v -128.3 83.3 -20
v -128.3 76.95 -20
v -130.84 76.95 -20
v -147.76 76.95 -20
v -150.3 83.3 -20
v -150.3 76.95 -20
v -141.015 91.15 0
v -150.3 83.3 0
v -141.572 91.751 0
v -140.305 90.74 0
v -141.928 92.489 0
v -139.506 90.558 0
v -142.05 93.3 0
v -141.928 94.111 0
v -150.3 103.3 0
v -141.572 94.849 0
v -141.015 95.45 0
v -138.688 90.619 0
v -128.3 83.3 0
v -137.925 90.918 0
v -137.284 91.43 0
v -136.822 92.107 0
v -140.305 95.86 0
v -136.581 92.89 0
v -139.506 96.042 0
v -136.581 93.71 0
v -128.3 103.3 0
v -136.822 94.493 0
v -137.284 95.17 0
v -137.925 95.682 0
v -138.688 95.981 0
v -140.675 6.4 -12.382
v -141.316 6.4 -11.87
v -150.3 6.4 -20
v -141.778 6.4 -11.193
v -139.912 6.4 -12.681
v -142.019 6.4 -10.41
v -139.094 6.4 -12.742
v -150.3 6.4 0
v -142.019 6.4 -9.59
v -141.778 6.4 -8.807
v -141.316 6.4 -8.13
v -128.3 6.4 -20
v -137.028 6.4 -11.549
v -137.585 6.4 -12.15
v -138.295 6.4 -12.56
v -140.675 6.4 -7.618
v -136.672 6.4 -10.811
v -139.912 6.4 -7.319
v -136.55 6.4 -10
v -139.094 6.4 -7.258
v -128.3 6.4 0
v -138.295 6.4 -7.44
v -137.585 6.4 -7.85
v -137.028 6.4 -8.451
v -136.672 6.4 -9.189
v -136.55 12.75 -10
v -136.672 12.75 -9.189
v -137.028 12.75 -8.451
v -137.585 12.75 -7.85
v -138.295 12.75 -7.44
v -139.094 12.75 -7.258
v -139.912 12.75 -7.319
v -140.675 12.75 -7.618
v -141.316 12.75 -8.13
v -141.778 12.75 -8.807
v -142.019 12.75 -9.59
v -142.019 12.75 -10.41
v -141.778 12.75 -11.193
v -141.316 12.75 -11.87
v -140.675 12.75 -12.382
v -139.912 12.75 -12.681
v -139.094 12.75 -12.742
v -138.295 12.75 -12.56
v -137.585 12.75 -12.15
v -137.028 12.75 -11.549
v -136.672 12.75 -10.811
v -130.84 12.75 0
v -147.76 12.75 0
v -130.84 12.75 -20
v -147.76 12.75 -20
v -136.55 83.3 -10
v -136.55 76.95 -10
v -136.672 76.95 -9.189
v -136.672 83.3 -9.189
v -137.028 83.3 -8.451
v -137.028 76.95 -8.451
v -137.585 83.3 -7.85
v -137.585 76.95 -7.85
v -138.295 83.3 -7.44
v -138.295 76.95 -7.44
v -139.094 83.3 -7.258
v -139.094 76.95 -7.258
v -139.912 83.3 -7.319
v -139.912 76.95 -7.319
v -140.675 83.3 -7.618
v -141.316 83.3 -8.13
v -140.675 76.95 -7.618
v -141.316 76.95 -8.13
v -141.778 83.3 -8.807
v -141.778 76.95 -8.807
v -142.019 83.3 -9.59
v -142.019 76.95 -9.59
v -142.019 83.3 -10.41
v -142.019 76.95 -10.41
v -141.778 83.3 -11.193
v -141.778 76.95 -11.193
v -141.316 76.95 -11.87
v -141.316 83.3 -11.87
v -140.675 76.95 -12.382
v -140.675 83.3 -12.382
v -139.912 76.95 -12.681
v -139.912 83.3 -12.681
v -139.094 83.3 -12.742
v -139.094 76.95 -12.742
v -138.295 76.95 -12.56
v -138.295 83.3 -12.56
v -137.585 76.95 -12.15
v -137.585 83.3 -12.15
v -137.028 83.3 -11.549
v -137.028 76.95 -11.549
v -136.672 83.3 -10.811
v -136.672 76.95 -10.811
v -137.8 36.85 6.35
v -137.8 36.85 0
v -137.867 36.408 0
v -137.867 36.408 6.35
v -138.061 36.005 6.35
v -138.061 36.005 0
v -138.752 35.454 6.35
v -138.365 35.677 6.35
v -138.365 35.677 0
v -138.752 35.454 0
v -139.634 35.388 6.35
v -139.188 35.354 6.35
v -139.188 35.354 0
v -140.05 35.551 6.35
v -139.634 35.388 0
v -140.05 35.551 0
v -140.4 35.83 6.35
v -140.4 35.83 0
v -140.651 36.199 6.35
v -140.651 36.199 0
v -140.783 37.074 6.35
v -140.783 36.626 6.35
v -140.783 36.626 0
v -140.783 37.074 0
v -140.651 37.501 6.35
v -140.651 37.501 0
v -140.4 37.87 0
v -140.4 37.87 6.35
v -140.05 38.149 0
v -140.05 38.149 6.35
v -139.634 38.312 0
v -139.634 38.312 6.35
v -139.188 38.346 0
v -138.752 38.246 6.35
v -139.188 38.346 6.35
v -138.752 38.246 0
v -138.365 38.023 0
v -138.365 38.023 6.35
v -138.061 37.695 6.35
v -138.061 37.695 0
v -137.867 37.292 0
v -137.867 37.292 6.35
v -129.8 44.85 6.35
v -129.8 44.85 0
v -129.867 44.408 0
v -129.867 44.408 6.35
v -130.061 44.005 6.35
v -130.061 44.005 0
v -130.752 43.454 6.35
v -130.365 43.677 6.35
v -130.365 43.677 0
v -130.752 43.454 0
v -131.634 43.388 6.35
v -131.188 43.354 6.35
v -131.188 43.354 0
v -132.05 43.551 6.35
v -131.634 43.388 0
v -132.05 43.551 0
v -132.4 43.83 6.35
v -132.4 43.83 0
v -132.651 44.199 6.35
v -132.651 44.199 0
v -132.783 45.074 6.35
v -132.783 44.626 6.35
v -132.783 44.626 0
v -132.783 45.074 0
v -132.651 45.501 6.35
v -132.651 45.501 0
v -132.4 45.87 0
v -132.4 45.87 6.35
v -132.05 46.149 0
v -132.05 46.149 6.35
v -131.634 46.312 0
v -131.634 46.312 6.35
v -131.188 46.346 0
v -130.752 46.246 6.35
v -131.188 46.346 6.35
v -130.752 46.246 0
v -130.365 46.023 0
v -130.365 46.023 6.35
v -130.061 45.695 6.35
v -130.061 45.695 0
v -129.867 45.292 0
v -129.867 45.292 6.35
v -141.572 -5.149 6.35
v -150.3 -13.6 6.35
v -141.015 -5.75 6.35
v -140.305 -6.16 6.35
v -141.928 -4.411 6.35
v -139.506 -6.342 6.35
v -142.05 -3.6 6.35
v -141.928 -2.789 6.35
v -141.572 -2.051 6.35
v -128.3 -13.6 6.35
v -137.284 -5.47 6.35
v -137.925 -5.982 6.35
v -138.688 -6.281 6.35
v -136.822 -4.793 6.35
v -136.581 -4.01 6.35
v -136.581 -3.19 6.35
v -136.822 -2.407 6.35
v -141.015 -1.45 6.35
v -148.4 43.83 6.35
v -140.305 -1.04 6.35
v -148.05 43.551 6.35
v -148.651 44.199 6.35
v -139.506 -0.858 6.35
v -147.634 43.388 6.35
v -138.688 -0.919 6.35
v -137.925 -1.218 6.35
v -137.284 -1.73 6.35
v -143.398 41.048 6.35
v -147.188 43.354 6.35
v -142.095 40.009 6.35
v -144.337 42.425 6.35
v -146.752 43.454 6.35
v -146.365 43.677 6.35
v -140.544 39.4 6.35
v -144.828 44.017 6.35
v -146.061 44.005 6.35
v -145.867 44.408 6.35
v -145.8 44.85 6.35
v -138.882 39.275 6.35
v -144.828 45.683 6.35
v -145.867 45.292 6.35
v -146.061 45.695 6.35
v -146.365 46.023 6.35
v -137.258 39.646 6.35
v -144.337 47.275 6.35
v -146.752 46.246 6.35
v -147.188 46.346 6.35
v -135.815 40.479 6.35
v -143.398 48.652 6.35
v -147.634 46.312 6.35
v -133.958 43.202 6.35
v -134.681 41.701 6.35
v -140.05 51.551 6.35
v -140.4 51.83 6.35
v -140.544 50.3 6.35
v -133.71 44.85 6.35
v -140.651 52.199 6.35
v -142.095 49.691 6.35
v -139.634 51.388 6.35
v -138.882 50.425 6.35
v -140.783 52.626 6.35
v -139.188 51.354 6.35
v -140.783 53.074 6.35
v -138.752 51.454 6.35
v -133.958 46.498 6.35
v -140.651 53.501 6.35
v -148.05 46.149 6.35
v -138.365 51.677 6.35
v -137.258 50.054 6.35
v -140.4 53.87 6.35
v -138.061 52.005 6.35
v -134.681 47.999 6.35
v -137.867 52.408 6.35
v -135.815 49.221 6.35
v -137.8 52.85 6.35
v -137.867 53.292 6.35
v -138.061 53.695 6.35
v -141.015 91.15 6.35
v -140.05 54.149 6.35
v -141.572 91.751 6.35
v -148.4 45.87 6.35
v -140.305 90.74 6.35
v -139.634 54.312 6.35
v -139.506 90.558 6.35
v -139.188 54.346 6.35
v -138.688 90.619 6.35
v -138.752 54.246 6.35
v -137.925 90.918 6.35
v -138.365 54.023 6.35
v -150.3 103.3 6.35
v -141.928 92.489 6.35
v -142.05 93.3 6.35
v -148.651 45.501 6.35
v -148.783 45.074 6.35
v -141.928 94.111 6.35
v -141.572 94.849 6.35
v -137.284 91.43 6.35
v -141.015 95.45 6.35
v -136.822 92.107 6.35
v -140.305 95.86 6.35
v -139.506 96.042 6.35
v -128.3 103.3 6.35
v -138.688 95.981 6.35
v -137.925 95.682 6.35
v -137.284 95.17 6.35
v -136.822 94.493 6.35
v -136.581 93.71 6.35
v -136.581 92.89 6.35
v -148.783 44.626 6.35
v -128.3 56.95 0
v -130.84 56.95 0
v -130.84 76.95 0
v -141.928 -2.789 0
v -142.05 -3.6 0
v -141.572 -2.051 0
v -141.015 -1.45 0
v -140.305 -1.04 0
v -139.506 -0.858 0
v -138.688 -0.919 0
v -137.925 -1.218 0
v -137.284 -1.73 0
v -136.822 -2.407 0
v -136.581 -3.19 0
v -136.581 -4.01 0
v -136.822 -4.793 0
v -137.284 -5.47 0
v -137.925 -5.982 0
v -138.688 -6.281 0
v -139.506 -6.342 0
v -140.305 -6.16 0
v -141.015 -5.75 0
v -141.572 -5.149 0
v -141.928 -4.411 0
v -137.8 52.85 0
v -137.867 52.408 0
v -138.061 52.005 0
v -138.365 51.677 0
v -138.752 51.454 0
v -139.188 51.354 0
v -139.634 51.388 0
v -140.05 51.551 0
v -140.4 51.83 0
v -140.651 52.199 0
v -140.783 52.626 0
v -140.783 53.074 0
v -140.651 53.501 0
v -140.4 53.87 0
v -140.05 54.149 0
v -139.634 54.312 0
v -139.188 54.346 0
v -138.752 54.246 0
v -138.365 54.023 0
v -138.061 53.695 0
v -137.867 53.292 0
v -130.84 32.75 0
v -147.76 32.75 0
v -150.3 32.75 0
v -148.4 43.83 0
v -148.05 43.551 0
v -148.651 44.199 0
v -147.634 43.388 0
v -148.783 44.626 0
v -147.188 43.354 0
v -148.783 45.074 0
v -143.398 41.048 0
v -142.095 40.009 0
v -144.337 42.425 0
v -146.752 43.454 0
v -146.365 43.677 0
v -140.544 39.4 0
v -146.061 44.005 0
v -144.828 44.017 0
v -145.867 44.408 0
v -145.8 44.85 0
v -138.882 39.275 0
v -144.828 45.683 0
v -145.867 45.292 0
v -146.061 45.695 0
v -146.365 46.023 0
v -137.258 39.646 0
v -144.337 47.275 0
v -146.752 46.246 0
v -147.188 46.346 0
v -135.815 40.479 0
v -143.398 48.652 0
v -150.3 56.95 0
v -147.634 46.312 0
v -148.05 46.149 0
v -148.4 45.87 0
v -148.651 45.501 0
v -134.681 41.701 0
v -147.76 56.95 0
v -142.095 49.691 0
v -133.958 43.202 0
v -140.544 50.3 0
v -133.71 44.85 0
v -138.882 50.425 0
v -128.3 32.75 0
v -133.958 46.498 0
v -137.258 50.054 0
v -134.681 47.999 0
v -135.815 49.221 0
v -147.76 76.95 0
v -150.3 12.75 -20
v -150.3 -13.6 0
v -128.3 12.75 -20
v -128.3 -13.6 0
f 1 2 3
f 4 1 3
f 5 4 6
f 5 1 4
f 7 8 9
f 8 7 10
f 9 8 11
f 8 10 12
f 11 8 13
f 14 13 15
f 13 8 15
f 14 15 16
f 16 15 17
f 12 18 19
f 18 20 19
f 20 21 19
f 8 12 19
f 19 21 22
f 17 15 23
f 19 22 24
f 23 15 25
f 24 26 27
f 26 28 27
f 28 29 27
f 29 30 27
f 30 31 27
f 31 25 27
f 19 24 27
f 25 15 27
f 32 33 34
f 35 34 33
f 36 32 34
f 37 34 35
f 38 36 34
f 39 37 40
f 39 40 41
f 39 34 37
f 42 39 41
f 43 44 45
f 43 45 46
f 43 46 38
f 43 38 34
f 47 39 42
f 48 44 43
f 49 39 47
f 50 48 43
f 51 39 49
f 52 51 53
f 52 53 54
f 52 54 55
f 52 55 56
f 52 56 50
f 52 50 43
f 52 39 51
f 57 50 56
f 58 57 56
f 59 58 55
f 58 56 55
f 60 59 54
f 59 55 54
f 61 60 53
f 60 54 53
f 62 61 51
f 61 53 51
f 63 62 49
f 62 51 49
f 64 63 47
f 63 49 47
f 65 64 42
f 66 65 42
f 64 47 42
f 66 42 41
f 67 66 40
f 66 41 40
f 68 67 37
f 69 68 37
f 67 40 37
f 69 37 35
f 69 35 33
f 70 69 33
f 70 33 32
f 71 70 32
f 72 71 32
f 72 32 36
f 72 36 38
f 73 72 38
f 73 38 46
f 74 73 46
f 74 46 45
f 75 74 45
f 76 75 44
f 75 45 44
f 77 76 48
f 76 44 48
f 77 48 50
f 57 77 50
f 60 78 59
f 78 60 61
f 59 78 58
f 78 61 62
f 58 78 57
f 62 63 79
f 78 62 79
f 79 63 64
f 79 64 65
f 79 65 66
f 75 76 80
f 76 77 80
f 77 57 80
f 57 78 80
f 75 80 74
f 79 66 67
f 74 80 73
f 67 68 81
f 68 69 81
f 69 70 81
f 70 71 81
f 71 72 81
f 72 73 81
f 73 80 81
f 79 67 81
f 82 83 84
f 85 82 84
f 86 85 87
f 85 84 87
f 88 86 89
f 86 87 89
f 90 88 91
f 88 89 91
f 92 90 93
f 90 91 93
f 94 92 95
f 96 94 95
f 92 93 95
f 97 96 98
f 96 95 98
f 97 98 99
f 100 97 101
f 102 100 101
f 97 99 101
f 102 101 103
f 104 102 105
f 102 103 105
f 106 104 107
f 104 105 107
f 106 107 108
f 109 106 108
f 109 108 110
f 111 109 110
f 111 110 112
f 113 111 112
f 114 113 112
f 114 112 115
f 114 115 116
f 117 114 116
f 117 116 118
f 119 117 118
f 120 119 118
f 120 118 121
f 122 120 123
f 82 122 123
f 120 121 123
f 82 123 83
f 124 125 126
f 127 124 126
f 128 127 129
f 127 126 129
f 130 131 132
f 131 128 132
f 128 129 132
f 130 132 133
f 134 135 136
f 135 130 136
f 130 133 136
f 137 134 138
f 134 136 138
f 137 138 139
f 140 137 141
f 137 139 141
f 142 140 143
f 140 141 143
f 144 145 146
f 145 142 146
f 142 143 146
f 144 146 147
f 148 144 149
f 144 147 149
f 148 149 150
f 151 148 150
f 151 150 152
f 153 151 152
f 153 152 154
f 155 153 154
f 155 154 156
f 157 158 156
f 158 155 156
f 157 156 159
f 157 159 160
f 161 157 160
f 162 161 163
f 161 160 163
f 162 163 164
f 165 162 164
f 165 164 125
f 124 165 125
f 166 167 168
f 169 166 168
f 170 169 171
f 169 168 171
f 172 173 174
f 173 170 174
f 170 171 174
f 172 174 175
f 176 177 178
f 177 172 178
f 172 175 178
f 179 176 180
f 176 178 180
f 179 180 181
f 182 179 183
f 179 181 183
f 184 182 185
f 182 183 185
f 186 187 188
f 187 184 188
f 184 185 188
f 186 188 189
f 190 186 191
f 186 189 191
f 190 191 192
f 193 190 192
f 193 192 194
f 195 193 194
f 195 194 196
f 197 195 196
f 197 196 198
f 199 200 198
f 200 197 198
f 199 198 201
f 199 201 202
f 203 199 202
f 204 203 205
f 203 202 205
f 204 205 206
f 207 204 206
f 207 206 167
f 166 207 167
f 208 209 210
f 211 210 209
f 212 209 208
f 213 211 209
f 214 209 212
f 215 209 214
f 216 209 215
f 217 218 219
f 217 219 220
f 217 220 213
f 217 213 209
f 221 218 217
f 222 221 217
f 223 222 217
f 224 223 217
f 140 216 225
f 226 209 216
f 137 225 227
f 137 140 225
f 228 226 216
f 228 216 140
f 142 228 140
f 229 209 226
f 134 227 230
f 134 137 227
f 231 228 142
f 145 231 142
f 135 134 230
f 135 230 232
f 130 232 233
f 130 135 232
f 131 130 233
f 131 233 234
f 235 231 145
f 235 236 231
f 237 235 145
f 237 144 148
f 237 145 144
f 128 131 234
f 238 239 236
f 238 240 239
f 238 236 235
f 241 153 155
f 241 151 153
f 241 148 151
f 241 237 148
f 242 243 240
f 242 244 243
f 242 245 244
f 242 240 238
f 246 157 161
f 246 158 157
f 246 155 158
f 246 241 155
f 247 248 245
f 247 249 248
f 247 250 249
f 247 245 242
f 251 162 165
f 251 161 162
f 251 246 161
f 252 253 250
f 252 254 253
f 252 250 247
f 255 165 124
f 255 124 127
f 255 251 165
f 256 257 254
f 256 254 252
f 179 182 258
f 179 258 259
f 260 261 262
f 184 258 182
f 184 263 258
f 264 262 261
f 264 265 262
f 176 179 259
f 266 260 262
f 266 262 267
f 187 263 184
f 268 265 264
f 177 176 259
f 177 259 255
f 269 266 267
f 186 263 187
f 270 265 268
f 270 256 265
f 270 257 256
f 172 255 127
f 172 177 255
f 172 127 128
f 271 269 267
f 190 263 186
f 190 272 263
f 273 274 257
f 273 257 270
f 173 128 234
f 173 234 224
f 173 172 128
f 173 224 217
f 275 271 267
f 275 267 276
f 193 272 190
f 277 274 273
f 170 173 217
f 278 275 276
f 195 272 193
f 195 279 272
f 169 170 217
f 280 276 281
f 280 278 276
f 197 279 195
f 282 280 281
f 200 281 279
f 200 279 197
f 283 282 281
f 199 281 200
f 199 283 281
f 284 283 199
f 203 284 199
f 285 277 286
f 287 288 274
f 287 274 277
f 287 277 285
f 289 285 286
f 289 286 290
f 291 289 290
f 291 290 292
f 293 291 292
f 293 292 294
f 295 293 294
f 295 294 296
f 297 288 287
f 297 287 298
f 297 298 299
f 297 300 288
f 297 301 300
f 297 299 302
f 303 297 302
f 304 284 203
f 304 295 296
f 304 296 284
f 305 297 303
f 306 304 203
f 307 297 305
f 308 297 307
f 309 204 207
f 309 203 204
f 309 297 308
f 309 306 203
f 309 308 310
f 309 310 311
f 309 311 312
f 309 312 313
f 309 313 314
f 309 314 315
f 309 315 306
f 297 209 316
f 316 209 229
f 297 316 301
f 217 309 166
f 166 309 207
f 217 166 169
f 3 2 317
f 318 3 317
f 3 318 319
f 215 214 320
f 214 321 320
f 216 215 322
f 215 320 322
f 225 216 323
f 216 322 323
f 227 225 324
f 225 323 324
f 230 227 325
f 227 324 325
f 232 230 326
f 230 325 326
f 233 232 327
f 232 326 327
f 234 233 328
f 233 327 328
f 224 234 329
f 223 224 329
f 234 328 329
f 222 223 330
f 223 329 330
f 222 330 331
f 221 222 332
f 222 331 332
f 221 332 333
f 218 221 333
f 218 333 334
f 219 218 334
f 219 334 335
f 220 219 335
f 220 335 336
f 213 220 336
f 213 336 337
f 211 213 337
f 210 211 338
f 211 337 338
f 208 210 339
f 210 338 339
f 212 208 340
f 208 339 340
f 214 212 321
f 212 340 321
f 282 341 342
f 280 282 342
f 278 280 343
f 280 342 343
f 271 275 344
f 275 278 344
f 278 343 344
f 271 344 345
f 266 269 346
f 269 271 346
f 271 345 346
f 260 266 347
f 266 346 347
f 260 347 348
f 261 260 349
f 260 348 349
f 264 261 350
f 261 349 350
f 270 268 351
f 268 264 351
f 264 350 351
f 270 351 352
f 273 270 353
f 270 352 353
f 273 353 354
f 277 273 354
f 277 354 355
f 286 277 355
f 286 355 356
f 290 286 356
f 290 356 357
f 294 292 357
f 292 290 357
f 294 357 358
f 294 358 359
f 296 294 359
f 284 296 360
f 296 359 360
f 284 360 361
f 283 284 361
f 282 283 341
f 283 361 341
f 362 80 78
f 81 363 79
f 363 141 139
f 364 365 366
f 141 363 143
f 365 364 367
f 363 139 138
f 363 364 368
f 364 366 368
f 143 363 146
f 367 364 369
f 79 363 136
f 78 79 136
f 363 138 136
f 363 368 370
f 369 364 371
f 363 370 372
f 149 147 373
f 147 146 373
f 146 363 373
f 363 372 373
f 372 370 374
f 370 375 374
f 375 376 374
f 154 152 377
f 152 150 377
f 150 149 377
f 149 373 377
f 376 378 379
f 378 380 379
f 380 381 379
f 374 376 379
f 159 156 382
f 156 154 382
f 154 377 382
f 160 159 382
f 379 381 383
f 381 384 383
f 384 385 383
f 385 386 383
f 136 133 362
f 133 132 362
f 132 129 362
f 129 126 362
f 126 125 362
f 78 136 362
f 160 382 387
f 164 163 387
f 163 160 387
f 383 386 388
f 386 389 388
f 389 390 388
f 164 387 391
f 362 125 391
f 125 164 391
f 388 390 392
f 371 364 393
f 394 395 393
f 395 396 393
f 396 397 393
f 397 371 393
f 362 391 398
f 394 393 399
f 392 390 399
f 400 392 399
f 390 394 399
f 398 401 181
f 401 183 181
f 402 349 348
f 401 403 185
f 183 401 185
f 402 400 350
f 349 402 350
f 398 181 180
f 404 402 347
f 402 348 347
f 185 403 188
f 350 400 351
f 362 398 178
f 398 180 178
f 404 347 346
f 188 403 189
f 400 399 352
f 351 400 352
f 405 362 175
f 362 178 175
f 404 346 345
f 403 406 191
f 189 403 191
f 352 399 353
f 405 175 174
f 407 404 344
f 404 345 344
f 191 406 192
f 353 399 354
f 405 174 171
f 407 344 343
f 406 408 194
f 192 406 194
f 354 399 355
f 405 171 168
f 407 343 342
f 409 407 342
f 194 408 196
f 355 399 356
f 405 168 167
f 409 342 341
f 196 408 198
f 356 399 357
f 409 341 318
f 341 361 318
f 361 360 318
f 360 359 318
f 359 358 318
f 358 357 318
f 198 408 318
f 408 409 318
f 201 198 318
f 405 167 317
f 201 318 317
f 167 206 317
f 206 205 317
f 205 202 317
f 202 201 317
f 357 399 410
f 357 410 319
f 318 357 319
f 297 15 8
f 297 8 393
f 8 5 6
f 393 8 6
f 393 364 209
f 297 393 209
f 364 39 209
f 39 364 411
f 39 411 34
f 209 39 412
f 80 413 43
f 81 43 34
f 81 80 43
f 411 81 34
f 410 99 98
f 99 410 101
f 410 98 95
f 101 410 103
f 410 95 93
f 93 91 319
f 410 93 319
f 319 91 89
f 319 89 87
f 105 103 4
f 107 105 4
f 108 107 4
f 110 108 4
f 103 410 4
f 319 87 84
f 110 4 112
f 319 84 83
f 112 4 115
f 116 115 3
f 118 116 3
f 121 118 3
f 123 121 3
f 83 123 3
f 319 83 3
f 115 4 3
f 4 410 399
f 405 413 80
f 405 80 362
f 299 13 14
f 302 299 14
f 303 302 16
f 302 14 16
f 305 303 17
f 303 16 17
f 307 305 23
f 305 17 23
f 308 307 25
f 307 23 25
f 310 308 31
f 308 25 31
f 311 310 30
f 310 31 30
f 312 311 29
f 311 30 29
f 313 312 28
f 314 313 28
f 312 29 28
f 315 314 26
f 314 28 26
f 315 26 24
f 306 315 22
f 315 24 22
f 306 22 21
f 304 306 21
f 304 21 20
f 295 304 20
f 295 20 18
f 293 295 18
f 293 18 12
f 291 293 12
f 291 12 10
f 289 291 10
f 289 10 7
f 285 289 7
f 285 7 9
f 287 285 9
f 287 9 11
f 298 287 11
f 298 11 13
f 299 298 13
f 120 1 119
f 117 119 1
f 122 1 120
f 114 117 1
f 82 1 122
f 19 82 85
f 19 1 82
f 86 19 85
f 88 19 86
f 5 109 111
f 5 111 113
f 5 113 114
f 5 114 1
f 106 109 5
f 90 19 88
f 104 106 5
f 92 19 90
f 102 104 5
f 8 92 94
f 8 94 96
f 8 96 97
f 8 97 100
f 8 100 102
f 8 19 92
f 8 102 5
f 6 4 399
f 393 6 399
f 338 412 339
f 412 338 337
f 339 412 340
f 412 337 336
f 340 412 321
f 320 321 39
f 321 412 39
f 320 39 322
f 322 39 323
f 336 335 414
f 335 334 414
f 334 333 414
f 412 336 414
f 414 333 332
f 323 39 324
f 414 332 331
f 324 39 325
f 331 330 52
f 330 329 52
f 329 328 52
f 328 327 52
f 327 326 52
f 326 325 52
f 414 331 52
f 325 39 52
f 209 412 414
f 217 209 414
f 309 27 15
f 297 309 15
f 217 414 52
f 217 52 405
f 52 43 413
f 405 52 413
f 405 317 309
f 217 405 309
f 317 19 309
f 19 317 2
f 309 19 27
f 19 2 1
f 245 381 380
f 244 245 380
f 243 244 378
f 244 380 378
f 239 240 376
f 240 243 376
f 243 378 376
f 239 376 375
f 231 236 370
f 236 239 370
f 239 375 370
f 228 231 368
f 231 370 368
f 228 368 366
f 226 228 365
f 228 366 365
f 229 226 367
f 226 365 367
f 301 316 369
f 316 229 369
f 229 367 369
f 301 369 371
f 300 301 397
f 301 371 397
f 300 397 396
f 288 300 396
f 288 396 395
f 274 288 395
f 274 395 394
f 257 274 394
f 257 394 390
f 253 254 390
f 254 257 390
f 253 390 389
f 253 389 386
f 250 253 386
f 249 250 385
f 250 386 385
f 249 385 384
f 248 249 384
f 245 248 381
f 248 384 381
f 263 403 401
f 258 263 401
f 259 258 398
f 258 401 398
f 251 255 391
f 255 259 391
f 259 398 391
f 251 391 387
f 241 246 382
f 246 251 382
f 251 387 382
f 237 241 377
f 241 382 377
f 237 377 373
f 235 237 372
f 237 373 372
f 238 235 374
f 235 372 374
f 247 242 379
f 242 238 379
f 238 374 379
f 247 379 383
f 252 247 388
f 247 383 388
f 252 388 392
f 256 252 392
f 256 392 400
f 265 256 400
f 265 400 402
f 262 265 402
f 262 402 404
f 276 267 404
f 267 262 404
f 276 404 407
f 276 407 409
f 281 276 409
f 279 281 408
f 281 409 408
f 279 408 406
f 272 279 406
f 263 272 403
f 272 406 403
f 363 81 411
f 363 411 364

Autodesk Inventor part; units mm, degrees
ref_plane "YZ Plane" through (0, 0, 0) normal (1, 0, 0) x (0, 1, 0)
ref_plane "XZ Plane" through (0, 0, 0) normal (0, 1, 0) x (-1, 0, 0)
sketch "Sketch1" plane through (0, 0, 0) normal (0, 0, 1) x (1, 0, 0)
  circle A0 centre (-131.3, 44.85) radius 1.5 projected
  circle A1 centre (-147.3, 44.85) radius 1.5 projected
  circle A2 centre (-139.3, 52.85) radius 1.5 projected
  circle A3 centre (-139.3, 36.85) radius 1.5 projected
  circle A4 centre (-139.3, 44.85) radius 4 projected
  circle A5 centre (-139.3, 44.85) radius 11 projected
  line L0 (-250, 102.05) -> (-125, 102.05) projected
  line L1 (-250, 96.9) -> (-250, 102.05) projected
  line L2 (-125, 96.9) -> (-250, 96.9) projected
  line L3 (-125, 96.9) -> (-125, 102.05) projected
  line L4 (-125, 103.3) -> (-250, 103.3) projected
  line L5 (-125, 84.55) -> (-250, 84.55) projected
  line L6 (-125, 84.55) -> (-125, 89.7) projected
  line L7 (-125, 89.7) -> (-250, 89.7) projected
  line L8 (-250, 84.55) -> (-250, 89.7) projected
  line L9 (-250, 83.3) -> (-125, 83.3) projected
  line L10 (-250, 5.15) -> (-125, 5.15) projected
  line L11 (-250, 0) -> (-250, 5.15) projected
  line L12 (0, 0) -> (-250, 0) projected
  line L13 (-125, 0) -> (-125, 5.15) projected
  line L14 (-125, -12.35) -> (-250, -12.35) projected
  line L15 (-125, -12.35) -> (-125, -7.2) projected
  line L16 (-125, -7.2) -> (-250, -7.2) projected
  line L17 (-250, -12.35) -> (-250, -7.2) projected
  line L18 (-250, -13.6) -> (-125, -13.6) projected
  line L19 (-125, 6.4) -> (-250, 6.4) projected
  line L20 (-128.3, 103.3) -> (-150.3, 103.3)
  line L21 (-150.3, 103.3) -> (-150.3, -13.6)
  line L22 (-150.3, -13.6) -> (-128.3, -13.6)
  line L23 (-128.3, -13.6) -> (-128.3, 103.3)
  circle A6 centre (-139.3, 44.85) radius 5.5902
extrude "Extrusion1" add sketch "Sketch1" along normal blind 6.35 contours A5 | L23 L19 L21 A5 | A5 L21 L9 L23 | L23 L10 L21 L19 | L9 L21 L5 L23 | L23 L12 L21 L10 | L5 L21 L7 L23 | L23 L16 L21 L12 | L7 L21 L2 L23 | L23 L14 L21 L16 | L2 L21 L0 L23 | L23 L18 L21 L14 | L0 L21 L4 L23
sketch "Sketch2" plane through (0, 0, 0) normal (0, 0, -1) x (-1, 0, 0)
  line L0 (125, 5.15) -> (250, 5.15) projected
  line L1 (125, 5.15) -> (125, 0) projected
  line L2 (125, 0) -> (250, 0) projected
  line L3 (250, 5.15) -> (250, 0) projected
  line L4 (250, 6.4) -> (125, 6.4) projected
  line L5 (250, 84.55) -> (125, 84.55) projected
  line L6 (250, 89.7) -> (250, 84.55) projected
  line L7 (125, 89.7) -> (250, 89.7) projected
  line L8 (125, 89.7) -> (125, 84.55) projected
  line L9 (125, 83.3) -> (250, 83.3) projected
  circle A0 centre (139.3, 44.85) radius 5.5902 projected
  circle A1 centre (139.3, 36.85) radius 1.5 projected
  circle A2 centre (139.3, 52.85) radius 1.5 projected
  circle A3 centre (147.3, 44.85) radius 1.5 projected
  circle A4 centre (131.3, 44.85) radius 1.5 projected
  line L10 (128.3, 103.3) -> (150.3, 103.3) projected
  line L11 (128.3, -13.6) -> (128.3, 103.3) projected
  line L12 (150.3, -13.6) -> (128.3, -13.6) projected
  line L13 (150.3, 103.3) -> (150.3, -13.6) projected
  line L14 (128.3, -13.6) -> (128.3, 103.3) projected
  line L15 (150.3, 103.3) -> (150.3, -13.6) projected
  line L16 (128.3, 6.4) -> (150.3, 6.4)
  line L17 (150.3, 6.4) -> (150.3, 12.75)
  line L18 (150.3, 12.75) -> (128.3, 12.75)
  line L19 (128.3, 12.75) -> (128.3, 6.4)
  line L20 (128.3, 83.3) -> (150.3, 83.3)
  line L21 (150.3, 83.3) -> (150.3, 76.95)
  line L22 (150.3, 76.95) -> (128.3, 76.95)
  line L23 (128.3, 76.95) -> (128.3, 83.3)
  point P0 (0, 0)
  dimension "d2" = 6.35
  dimension "d3" = 6.35
ref_plane "Work Plane1" through (-250, -12.35, -20) normal (0, 0, -1) x (0, 1, 0)
extrude "Extrusion2" add sketch "Sketch2" along normal up to surface (20 mm away) contours L11 L18 L13 L4 | L11 L9 L13 L22
sketch "Sketch3" plane through (-128.3, -13.6, 6.35) normal (1, 0, 0) x (0, 0, -1)
  line L0 (6.35, 26.35) -> (26.35, 26.35) projected
  line L1 (26.35, 26.35) -> (6.35, 46.35)
  line L2 (6.35, 26.35) -> (6.35, 90.55) projected
  line L3 (6.35, 90.55) -> (26.35, 90.55) projected
  line L4 (26.35, 90.55) -> (6.35, 70.55)
  line L5 (6.35, 70.55) -> (6.35, 90.55)
  line L6 (26.35, 90.55) -> (6.35, 90.55)
  line L7 (6.35, 46.35) -> (6.35, 26.35)
  line L8 (26.35, 26.35) -> (6.35, 26.35)
  point P0 (6.35, 13.6)
  dimension "d6" = 45
  dimension "d7" = 45
extrude "Extrusion3" add sketch "Sketch3" against normal up to surface (22 mm away)
sketch "Sketch4" plane through (-128.3, 83.3, -20) normal (0, 0, -1) x (-1, 0, 0)
  line L0 (0, 0) -> (22, 0) projected
  line L1 (0, -6.35) -> (0, 0) projected
  line L2 (22, -6.35) -> (0, -6.35) projected
  line L3 (22, 0) -> (22, -6.35) projected
  line L4 (0, -76.9) -> (0, -70.55) projected
  line L5 (22, -76.9) -> (0, -76.9) projected
  line L6 (22, -70.55) -> (22, -76.9) projected
  line L7 (0, -70.55) -> (22, -70.55) projected
  line L8 (22, -26.35) -> (22, -6.35) projected
  line L9 (22, -6.35) -> (0, -6.35) projected
  line L10 (0, -26.35) -> (0, -6.35) projected
  line L11 (22, -26.35) -> (0, -26.35) projected
  line L12 (22, -70.55) -> (22, -50.55) projected
  line L13 (0, -50.55) -> (22, -50.55) projected
  line L14 (0, -70.55) -> (0, -50.55) projected
  line L15 (0, -70.55) -> (22, -70.55) projected
  line L16 (22, -6.35) -> (0, -6.35) projected
  line L17 (11, -6.35) -> (11, -70.55)
  line L18 (0, -70.55) -> (22, -70.55) projected
  line L19 (19.46, -70.55) -> (2.54, -70.55)
  line L20 (2.54, -70.55) -> (2.54, -6.35)
  line L21 (2.54, -6.35) -> (19.46, -6.35)
  line L22 (19.46, -6.35) -> (19.46, -70.55)
  line L23 (19.46, -70.55) -> (2.54, -6.35) construction
  line L24 (2.54, -70.55) -> (19.46, -6.35) construction
  point P0 (-128.3, -83.3)
  point P1 (11, -38.45)
  dimension "d10" = 2.54
extrude "Extrusion4" cut sketch "Sketch4" against normal up to surface (20 mm away) contours L2 L17 L11 L20 | L22 L11 L17 L2 | L11 L17 L13 L20 | L22 L13 L17 L11 | L13 L17 L7 L20 | L22 L7 L17 L13
sketch "Sketch5" plane through (-150.3, 6.4, 0) normal (0, -1, 0) x (1, 0, 0)
  line L0 (0, -20) -> (22, -20) projected
  line L1 (2.54, 0) -> (0, 0) projected
  line L2 (22, -20) -> (0, 0)
  circle A0 centre (11, -10) radius 2.75
  point P0 (150.3, 0)
  dimension "d13" = 5.5
extrude "Extrusion5" cut sketch "Sketch5" against normal through all
sketch "Sketch6" plane through (0, 0, 0) normal (0, 0, -1) x (-1, 0, 0)
  line L0 (128.3, 83.3) -> (150.3, 83.3) projected
  line L1 (128.3, 76.95) -> (128.3, 83.3) projected
  line L2 (130.84, 76.95) -> (128.3, 76.95) projected
  line L3 (147.76, 76.95) -> (130.84, 76.95) projected
  line L4 (150.3, 76.95) -> (147.76, 76.95) projected
  line L5 (150.3, 83.3) -> (150.3, 76.95) projected
  line L6 (128.3, 6.4) -> (128.3, 12.75) projected
  line L7 (150.3, 6.4) -> (128.3, 6.4) projected
  line L8 (150.3, 12.75) -> (150.3, 6.4) projected
  line L9 (147.76, 12.75) -> (150.3, 12.75) projected
  line L10 (130.84, 12.75) -> (147.76, 12.75) projected
  line L11 (128.3, 12.75) -> (130.84, 12.75) projected
  line L12 (128.3, 103.3) -> (150.3, 103.3) projected
  line L13 (150.3, -13.6) -> (128.3, -13.6) projected
  line L14 (139.3, 103.3) -> (139.3, 83.3)
  line L15 (139.3, 6.4) -> (139.3, -13.6)
  circle A0 centre (139.3, 93.3) radius 2.75
  circle A1 centre (139.3, -3.6) radius 2.75
  point P0 (0, 0)
  dimension "d16" = 5.5
extrude "Extrusion6" cut sketch "Sketch6" against normal through all contours A0 L14 | L14 A0 | A1 L15 | L15 A1
properties part number "ZNutHolder"
